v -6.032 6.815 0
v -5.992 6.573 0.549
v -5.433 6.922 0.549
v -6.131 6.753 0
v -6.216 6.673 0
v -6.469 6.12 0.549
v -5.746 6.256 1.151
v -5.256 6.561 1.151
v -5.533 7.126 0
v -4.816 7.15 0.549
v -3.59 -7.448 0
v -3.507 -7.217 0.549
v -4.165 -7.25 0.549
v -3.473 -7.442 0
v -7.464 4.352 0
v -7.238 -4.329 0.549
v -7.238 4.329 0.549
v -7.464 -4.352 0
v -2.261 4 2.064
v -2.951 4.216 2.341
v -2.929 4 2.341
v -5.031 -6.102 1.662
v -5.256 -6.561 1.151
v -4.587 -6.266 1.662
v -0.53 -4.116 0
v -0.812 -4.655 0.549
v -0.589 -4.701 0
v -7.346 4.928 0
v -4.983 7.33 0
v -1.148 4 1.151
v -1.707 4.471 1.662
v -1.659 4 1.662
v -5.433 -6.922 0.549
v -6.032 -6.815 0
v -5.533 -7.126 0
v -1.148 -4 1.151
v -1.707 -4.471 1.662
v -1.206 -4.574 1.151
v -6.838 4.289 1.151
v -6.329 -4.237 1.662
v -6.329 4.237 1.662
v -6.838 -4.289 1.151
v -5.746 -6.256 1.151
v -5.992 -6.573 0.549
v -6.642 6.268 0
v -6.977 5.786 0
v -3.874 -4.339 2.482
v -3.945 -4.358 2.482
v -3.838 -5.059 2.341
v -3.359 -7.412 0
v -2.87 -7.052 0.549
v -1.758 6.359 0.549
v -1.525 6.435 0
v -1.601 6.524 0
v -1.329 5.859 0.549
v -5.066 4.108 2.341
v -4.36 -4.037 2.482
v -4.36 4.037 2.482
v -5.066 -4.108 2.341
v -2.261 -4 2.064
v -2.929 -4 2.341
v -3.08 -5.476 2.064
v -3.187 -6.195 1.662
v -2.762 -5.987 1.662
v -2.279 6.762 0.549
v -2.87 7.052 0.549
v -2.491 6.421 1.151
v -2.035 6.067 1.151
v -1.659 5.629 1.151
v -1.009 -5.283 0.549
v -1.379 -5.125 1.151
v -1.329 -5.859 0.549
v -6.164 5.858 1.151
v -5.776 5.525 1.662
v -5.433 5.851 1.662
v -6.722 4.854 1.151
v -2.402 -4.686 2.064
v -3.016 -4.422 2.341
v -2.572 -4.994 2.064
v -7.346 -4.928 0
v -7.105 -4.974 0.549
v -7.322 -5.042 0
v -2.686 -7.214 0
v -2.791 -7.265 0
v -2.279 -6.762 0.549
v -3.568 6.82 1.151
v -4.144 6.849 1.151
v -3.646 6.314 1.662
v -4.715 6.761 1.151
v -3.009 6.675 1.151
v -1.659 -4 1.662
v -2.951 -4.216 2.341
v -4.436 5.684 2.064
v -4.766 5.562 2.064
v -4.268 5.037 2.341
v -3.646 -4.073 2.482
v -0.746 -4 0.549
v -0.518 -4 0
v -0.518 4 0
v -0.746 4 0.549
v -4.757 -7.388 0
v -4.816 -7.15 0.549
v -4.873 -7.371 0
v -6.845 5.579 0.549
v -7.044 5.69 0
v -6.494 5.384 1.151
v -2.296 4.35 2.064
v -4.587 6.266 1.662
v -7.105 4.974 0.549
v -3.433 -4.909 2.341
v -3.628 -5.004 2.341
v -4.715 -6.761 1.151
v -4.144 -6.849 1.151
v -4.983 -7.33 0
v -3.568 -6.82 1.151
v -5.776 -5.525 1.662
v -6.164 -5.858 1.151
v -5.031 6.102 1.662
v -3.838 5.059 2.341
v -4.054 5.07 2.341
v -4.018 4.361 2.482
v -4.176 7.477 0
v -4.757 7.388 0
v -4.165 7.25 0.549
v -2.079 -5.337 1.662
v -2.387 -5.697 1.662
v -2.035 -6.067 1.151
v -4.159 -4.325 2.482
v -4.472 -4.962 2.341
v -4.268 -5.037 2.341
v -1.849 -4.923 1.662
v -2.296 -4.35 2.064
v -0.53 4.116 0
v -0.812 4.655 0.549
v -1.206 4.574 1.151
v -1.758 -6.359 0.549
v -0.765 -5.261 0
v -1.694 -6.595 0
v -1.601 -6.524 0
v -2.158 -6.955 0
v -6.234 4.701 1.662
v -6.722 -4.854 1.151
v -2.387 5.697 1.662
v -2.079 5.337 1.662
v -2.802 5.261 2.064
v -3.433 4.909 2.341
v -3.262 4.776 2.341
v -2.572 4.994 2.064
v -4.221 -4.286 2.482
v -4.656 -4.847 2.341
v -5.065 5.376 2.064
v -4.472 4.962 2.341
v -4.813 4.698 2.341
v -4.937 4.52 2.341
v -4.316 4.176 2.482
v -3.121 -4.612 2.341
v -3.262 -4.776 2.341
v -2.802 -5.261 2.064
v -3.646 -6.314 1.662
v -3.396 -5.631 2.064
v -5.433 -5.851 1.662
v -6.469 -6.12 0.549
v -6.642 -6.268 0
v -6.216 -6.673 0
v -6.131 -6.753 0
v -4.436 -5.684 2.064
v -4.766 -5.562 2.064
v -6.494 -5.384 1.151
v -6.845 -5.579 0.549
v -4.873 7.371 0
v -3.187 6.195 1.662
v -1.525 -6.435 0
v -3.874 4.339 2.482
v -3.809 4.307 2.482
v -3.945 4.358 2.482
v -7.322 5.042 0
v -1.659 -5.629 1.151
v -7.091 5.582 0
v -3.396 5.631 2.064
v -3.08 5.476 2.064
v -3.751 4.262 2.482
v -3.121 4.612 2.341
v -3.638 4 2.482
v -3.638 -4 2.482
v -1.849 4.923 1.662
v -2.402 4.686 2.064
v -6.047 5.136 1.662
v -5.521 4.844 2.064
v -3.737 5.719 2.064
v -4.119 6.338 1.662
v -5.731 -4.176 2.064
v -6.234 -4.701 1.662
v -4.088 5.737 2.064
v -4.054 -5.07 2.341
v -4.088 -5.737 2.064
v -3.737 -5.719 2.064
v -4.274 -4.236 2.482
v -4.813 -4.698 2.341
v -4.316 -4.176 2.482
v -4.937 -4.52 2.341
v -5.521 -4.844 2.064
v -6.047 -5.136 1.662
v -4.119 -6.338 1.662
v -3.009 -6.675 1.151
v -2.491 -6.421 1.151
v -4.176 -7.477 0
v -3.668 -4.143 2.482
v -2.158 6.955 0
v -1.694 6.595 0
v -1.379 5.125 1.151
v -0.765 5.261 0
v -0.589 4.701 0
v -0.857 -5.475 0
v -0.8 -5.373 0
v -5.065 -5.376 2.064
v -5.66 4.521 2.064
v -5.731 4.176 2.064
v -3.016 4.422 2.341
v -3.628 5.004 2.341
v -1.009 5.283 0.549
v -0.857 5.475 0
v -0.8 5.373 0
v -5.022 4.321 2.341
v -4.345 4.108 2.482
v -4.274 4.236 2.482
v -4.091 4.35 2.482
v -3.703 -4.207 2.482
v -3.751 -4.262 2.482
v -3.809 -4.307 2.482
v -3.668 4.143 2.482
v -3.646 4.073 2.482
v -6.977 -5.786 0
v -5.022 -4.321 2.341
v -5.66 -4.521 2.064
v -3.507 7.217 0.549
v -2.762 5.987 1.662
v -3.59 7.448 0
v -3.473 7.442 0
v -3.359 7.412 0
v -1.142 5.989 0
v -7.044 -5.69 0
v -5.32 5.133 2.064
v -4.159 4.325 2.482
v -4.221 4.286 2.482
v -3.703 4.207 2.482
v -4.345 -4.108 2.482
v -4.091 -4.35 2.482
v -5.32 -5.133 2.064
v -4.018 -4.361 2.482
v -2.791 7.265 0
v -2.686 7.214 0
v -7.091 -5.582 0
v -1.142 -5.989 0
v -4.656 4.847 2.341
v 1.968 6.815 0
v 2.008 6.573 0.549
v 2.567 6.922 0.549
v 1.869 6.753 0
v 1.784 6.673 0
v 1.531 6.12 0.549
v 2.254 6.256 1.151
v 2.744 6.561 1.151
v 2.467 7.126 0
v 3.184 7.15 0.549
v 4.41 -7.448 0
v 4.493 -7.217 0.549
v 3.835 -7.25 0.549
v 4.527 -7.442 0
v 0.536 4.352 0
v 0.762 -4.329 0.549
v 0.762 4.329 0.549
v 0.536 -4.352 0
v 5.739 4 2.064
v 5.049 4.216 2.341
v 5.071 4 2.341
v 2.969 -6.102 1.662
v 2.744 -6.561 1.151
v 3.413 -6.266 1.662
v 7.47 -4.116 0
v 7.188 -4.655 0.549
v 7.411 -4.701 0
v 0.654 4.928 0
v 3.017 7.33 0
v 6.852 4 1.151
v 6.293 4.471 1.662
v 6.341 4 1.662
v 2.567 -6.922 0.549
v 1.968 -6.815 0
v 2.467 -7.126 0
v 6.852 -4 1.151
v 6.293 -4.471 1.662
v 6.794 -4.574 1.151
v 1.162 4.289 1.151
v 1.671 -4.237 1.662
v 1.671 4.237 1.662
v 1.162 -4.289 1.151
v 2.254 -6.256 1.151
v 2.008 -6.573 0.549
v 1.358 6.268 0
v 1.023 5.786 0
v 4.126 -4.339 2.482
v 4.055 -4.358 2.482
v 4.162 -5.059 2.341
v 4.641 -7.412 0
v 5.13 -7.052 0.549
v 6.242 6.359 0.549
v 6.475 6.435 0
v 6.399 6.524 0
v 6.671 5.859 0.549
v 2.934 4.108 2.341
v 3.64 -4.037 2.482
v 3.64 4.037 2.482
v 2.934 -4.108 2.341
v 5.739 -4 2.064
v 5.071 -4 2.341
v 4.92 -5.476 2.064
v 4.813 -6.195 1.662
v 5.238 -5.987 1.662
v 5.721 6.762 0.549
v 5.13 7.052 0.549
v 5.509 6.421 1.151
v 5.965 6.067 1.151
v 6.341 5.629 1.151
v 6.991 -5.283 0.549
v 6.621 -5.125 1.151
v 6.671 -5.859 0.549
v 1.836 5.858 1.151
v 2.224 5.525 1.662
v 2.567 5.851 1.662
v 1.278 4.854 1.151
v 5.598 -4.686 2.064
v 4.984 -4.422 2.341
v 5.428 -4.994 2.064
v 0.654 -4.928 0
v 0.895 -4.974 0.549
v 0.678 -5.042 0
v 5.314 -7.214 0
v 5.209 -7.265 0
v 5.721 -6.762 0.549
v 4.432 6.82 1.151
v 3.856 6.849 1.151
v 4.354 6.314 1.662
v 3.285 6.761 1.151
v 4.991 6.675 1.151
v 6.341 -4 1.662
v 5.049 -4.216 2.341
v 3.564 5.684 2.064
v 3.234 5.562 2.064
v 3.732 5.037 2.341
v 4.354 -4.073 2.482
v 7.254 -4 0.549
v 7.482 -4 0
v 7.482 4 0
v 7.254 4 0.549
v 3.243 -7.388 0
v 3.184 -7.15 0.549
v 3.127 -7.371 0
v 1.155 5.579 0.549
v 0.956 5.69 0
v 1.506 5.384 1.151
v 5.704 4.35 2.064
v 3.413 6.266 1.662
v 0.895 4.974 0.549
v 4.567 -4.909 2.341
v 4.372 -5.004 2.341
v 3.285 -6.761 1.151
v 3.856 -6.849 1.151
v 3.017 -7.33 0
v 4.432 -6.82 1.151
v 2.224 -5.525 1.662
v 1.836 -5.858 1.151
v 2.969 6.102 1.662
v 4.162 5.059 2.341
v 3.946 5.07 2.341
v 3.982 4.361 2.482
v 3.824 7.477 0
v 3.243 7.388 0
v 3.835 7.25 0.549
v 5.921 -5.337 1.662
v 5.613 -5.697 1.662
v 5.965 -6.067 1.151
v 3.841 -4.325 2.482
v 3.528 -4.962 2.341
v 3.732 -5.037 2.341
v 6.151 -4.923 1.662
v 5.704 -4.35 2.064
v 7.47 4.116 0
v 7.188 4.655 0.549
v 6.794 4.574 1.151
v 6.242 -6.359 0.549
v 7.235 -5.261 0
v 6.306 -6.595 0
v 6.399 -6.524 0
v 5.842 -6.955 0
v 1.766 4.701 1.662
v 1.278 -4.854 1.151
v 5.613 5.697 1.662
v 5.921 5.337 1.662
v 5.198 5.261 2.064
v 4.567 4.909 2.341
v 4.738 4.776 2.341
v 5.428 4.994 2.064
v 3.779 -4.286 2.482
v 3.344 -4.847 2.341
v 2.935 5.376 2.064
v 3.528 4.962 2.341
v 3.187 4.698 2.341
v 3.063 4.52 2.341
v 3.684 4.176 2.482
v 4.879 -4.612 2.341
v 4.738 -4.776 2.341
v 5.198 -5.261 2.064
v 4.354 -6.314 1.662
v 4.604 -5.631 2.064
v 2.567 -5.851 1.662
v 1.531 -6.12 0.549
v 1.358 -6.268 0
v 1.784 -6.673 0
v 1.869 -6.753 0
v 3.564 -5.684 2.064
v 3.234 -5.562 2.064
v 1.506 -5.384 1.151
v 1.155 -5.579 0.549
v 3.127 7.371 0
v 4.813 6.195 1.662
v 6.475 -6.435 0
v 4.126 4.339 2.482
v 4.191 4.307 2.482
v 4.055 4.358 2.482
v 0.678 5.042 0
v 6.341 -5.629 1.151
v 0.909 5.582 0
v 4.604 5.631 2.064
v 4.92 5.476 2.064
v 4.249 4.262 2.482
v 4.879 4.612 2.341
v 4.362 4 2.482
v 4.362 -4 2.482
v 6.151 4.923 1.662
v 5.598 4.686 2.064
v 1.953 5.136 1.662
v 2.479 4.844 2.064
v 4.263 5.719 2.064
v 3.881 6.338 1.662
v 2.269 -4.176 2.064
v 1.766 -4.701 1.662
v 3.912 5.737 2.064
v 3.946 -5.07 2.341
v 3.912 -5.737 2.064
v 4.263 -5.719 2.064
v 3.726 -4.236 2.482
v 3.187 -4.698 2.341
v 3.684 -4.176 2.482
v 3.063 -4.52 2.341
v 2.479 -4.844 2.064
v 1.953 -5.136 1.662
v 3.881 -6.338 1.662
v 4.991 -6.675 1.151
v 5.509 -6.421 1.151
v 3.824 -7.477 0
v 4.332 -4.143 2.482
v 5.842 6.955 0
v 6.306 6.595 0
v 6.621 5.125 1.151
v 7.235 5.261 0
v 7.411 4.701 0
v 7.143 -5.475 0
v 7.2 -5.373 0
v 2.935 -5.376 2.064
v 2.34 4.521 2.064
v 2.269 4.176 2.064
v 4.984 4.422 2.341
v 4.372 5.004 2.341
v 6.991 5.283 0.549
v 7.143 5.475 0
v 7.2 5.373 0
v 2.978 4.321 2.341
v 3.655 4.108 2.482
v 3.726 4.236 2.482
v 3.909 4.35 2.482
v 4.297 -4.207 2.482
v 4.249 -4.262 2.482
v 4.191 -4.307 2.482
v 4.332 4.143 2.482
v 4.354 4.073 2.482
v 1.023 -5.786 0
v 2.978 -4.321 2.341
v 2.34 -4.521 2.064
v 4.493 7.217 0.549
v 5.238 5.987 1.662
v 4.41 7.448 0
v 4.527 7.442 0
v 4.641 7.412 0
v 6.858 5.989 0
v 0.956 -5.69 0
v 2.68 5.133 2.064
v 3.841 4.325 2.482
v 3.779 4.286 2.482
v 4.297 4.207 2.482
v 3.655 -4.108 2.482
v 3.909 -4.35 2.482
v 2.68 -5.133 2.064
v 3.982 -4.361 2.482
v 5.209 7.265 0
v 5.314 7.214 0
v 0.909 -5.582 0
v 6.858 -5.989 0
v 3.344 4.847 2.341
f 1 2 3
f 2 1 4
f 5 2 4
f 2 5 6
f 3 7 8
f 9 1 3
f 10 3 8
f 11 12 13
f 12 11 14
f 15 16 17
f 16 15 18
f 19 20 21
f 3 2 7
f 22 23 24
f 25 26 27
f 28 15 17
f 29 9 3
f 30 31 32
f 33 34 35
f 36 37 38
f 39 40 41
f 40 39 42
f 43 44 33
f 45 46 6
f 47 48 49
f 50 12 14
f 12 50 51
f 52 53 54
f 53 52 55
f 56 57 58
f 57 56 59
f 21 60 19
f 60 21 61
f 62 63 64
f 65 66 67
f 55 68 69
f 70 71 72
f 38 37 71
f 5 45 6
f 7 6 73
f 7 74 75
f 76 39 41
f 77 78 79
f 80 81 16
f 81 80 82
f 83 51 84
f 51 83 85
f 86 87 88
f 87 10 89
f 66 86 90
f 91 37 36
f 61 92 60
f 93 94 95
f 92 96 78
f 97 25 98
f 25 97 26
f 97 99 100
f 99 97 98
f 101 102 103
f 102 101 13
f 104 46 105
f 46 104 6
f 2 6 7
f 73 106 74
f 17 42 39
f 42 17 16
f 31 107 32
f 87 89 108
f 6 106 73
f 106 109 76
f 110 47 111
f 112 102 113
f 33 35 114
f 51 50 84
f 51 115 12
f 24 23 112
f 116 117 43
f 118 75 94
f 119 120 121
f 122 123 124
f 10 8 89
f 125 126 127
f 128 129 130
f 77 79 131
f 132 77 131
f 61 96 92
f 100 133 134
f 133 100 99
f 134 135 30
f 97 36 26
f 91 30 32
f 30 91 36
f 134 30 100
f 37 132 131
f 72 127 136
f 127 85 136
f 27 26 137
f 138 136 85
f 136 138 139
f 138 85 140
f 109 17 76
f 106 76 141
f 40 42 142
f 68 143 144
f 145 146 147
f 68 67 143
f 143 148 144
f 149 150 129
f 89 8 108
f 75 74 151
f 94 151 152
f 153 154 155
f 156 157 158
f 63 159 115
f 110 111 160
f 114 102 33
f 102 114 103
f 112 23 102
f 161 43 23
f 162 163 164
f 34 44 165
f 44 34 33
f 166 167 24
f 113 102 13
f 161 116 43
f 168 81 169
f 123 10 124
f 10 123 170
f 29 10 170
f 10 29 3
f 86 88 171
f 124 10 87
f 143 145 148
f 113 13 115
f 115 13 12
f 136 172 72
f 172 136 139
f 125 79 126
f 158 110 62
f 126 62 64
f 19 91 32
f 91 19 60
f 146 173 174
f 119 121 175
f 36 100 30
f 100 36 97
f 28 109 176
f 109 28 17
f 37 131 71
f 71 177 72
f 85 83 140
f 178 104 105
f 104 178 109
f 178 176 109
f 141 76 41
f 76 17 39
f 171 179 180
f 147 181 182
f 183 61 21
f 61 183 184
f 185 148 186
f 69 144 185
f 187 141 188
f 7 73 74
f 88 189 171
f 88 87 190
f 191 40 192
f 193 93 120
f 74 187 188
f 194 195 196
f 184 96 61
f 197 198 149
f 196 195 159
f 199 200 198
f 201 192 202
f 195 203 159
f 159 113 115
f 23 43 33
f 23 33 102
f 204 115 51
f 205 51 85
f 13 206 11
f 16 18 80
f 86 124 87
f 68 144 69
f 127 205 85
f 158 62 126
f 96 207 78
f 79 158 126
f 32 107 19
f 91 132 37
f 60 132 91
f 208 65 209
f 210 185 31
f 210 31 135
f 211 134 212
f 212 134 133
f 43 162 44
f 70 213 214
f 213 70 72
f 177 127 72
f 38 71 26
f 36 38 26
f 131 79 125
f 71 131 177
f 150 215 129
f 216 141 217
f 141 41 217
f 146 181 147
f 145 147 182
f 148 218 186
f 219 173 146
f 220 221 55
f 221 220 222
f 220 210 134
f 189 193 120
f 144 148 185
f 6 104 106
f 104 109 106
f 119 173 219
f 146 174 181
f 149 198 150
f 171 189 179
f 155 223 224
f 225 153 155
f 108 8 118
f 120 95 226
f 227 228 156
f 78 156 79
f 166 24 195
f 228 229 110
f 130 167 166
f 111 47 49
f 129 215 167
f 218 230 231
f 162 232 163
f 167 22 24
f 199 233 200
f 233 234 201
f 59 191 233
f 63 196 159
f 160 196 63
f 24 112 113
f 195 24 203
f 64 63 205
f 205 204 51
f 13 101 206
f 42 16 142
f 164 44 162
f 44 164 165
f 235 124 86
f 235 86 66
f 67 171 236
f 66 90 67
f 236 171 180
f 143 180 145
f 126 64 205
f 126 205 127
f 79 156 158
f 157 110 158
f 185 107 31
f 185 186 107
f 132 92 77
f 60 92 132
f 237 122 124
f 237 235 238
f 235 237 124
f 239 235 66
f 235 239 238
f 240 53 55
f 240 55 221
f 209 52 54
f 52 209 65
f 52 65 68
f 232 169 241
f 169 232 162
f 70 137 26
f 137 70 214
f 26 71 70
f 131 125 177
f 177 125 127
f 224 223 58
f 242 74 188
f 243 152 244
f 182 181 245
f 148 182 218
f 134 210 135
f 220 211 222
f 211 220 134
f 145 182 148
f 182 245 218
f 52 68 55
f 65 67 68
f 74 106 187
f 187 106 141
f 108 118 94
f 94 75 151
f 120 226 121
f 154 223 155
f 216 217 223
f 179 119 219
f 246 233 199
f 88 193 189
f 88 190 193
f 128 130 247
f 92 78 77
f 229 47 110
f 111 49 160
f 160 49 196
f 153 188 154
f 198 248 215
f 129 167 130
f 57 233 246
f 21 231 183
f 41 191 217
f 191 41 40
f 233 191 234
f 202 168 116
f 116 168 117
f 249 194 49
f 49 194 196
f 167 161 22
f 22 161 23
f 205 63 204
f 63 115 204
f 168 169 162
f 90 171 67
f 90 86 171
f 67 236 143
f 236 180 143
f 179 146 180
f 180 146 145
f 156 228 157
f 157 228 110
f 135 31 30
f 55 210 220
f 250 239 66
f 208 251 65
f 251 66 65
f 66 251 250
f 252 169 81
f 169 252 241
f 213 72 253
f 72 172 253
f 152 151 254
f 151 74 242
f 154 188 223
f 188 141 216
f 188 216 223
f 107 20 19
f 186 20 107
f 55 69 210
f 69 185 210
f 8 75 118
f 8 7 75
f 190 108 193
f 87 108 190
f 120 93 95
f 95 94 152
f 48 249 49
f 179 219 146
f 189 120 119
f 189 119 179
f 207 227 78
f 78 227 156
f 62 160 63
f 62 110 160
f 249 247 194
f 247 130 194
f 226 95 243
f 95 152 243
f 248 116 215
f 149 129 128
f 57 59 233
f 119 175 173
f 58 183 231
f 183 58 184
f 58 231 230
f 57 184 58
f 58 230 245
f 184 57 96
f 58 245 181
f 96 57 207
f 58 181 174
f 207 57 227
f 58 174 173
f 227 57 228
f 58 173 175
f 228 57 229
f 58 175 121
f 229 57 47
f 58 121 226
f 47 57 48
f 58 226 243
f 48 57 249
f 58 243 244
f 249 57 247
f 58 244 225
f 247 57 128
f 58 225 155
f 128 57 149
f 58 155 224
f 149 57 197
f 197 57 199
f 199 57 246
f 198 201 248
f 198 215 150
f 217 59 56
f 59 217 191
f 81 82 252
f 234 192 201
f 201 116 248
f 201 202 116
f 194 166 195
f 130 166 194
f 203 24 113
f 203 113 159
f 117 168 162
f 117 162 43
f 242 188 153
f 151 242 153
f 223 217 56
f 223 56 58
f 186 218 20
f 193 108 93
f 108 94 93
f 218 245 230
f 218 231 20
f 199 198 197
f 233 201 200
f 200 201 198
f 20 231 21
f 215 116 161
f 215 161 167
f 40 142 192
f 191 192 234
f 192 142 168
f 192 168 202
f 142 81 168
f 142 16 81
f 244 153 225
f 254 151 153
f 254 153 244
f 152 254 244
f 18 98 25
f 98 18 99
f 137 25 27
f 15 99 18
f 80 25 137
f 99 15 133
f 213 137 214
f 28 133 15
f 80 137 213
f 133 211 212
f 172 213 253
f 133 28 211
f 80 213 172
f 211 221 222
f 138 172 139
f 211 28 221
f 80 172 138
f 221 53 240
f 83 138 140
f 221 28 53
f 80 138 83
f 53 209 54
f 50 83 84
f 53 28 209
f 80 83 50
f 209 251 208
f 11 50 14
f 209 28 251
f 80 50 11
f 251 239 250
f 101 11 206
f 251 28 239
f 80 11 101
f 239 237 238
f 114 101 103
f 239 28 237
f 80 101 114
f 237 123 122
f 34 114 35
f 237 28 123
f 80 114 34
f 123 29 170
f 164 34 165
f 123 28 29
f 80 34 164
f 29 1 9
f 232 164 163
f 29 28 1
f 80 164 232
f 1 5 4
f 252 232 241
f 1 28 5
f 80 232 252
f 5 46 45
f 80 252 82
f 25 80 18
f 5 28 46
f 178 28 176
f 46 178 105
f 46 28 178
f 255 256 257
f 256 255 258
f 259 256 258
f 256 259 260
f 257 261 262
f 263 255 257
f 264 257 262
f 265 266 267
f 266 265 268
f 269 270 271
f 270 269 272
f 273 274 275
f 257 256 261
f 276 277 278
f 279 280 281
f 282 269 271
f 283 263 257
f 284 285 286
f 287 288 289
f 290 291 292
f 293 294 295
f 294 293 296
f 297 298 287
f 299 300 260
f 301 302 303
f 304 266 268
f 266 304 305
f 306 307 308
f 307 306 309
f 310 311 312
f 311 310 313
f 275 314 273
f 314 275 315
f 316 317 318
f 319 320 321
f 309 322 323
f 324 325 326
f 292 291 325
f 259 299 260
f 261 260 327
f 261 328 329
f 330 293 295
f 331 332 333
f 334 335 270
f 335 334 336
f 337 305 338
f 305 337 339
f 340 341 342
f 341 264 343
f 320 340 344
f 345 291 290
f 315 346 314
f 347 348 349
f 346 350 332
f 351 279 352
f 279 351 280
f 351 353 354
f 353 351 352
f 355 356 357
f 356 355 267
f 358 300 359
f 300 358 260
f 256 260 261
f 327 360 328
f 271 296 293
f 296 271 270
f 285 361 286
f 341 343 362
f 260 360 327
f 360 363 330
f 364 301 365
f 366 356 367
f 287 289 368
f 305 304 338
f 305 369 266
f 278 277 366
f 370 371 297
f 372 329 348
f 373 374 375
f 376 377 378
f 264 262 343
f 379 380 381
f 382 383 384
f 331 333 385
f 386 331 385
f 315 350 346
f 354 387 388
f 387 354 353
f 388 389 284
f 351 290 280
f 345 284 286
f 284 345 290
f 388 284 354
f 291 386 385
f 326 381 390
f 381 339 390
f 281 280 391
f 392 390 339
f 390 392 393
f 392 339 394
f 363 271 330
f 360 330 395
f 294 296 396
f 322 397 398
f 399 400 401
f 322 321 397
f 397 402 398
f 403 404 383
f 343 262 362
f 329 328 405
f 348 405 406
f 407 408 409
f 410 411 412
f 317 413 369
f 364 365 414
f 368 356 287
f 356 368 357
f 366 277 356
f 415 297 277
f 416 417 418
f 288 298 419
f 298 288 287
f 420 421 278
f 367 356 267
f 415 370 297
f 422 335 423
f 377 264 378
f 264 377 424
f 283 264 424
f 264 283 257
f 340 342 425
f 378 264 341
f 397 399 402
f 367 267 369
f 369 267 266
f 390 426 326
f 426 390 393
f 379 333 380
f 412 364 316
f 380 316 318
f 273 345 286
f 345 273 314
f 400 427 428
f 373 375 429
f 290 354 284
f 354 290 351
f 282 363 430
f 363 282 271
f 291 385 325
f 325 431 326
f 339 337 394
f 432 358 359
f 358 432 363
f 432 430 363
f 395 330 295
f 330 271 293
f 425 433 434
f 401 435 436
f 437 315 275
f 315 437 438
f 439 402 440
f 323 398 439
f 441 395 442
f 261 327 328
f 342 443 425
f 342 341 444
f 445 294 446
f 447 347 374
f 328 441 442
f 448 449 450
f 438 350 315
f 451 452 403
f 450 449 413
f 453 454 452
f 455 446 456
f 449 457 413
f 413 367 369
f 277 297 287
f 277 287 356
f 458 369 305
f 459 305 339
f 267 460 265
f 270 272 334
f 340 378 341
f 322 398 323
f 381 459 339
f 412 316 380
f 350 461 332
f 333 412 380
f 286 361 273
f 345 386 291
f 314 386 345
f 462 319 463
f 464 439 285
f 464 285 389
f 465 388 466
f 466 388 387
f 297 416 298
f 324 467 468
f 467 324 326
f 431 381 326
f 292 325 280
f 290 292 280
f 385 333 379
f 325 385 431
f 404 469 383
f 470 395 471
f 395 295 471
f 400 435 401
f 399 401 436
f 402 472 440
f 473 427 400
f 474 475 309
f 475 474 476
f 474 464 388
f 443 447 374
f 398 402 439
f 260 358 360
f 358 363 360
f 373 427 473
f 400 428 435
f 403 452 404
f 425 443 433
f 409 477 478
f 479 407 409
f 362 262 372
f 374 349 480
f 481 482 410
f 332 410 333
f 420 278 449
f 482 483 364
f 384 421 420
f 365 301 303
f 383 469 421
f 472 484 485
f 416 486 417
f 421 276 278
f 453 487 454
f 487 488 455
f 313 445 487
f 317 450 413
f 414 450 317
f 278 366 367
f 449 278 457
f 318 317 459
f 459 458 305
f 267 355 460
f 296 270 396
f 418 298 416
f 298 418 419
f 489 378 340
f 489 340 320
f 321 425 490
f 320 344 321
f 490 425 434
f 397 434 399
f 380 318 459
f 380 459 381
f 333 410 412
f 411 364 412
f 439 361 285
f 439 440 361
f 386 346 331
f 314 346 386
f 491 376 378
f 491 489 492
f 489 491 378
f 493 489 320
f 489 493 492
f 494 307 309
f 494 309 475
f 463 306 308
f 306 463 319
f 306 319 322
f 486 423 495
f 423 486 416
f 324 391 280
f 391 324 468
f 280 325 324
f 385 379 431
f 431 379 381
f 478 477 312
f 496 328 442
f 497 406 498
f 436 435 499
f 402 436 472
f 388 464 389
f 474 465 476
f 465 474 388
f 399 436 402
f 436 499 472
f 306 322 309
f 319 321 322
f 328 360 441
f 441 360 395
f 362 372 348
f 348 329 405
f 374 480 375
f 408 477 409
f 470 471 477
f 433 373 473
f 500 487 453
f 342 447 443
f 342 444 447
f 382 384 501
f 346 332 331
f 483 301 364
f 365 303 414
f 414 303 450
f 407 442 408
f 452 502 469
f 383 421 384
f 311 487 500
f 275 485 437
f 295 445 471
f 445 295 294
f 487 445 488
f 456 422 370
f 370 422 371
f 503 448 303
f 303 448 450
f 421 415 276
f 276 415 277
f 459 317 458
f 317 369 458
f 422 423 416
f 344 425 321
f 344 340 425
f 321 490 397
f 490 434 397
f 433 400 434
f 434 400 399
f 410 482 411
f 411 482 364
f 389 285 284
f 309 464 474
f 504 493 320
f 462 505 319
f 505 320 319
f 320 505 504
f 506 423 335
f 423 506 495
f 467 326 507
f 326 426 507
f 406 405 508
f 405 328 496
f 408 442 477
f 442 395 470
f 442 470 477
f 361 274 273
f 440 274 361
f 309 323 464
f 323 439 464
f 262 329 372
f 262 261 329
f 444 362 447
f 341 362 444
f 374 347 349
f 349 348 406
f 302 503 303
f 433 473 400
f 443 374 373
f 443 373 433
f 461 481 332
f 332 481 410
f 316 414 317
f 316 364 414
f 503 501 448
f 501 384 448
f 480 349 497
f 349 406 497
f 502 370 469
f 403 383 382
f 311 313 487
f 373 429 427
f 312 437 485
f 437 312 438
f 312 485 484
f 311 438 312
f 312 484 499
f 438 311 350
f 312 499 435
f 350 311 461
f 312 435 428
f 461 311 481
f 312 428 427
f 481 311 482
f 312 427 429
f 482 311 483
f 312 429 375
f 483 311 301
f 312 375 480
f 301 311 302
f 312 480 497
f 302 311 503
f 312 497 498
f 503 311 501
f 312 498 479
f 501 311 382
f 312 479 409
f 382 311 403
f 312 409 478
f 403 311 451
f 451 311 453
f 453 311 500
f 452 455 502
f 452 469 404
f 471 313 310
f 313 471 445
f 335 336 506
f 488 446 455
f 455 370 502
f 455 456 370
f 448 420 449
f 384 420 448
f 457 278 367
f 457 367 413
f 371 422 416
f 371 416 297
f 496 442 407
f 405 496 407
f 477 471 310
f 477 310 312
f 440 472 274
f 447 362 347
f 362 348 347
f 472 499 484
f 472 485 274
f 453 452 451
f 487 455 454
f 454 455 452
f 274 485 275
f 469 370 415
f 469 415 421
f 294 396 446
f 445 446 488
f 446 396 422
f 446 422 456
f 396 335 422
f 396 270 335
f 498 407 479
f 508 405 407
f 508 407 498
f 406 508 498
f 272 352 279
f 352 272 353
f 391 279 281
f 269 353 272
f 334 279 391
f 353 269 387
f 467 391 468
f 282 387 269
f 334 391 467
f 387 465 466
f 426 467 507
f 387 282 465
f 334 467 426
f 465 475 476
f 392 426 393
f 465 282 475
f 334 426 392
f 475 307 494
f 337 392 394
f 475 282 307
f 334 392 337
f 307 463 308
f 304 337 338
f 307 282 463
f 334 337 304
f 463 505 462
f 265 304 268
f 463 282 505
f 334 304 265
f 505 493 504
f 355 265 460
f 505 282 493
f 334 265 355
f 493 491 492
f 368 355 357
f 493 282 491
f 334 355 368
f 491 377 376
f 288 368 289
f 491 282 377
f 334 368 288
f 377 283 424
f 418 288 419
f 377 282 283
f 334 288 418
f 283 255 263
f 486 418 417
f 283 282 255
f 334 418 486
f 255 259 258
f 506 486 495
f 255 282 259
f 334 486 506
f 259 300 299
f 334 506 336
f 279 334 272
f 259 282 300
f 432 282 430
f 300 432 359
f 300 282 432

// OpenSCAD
$fn = 31;
module main(){
intersection(){
translate([0, 0, -3.5])
  hull(){
      translate([0, -5, 0])sphere(d=12);
      translate([0, 5, 0])sphere(d=12);
      };
translate([0, 0, 15])cube([30, 30, 30], center=true);    
}}

module arm(){
intersection(){
translate([0, 0, 2.5-3.69])
  hull(){
      translate([0, -4, 0])sphere(r=3.69);
      translate([0, 4, 0])sphere(r=3.69);
      };
translate([0, 0, 15])cube([30, 30, 30], center=true);    
    }
}

//main();
translate([-4, 0, 0])arm();
translate([4, 0, 0])arm();
